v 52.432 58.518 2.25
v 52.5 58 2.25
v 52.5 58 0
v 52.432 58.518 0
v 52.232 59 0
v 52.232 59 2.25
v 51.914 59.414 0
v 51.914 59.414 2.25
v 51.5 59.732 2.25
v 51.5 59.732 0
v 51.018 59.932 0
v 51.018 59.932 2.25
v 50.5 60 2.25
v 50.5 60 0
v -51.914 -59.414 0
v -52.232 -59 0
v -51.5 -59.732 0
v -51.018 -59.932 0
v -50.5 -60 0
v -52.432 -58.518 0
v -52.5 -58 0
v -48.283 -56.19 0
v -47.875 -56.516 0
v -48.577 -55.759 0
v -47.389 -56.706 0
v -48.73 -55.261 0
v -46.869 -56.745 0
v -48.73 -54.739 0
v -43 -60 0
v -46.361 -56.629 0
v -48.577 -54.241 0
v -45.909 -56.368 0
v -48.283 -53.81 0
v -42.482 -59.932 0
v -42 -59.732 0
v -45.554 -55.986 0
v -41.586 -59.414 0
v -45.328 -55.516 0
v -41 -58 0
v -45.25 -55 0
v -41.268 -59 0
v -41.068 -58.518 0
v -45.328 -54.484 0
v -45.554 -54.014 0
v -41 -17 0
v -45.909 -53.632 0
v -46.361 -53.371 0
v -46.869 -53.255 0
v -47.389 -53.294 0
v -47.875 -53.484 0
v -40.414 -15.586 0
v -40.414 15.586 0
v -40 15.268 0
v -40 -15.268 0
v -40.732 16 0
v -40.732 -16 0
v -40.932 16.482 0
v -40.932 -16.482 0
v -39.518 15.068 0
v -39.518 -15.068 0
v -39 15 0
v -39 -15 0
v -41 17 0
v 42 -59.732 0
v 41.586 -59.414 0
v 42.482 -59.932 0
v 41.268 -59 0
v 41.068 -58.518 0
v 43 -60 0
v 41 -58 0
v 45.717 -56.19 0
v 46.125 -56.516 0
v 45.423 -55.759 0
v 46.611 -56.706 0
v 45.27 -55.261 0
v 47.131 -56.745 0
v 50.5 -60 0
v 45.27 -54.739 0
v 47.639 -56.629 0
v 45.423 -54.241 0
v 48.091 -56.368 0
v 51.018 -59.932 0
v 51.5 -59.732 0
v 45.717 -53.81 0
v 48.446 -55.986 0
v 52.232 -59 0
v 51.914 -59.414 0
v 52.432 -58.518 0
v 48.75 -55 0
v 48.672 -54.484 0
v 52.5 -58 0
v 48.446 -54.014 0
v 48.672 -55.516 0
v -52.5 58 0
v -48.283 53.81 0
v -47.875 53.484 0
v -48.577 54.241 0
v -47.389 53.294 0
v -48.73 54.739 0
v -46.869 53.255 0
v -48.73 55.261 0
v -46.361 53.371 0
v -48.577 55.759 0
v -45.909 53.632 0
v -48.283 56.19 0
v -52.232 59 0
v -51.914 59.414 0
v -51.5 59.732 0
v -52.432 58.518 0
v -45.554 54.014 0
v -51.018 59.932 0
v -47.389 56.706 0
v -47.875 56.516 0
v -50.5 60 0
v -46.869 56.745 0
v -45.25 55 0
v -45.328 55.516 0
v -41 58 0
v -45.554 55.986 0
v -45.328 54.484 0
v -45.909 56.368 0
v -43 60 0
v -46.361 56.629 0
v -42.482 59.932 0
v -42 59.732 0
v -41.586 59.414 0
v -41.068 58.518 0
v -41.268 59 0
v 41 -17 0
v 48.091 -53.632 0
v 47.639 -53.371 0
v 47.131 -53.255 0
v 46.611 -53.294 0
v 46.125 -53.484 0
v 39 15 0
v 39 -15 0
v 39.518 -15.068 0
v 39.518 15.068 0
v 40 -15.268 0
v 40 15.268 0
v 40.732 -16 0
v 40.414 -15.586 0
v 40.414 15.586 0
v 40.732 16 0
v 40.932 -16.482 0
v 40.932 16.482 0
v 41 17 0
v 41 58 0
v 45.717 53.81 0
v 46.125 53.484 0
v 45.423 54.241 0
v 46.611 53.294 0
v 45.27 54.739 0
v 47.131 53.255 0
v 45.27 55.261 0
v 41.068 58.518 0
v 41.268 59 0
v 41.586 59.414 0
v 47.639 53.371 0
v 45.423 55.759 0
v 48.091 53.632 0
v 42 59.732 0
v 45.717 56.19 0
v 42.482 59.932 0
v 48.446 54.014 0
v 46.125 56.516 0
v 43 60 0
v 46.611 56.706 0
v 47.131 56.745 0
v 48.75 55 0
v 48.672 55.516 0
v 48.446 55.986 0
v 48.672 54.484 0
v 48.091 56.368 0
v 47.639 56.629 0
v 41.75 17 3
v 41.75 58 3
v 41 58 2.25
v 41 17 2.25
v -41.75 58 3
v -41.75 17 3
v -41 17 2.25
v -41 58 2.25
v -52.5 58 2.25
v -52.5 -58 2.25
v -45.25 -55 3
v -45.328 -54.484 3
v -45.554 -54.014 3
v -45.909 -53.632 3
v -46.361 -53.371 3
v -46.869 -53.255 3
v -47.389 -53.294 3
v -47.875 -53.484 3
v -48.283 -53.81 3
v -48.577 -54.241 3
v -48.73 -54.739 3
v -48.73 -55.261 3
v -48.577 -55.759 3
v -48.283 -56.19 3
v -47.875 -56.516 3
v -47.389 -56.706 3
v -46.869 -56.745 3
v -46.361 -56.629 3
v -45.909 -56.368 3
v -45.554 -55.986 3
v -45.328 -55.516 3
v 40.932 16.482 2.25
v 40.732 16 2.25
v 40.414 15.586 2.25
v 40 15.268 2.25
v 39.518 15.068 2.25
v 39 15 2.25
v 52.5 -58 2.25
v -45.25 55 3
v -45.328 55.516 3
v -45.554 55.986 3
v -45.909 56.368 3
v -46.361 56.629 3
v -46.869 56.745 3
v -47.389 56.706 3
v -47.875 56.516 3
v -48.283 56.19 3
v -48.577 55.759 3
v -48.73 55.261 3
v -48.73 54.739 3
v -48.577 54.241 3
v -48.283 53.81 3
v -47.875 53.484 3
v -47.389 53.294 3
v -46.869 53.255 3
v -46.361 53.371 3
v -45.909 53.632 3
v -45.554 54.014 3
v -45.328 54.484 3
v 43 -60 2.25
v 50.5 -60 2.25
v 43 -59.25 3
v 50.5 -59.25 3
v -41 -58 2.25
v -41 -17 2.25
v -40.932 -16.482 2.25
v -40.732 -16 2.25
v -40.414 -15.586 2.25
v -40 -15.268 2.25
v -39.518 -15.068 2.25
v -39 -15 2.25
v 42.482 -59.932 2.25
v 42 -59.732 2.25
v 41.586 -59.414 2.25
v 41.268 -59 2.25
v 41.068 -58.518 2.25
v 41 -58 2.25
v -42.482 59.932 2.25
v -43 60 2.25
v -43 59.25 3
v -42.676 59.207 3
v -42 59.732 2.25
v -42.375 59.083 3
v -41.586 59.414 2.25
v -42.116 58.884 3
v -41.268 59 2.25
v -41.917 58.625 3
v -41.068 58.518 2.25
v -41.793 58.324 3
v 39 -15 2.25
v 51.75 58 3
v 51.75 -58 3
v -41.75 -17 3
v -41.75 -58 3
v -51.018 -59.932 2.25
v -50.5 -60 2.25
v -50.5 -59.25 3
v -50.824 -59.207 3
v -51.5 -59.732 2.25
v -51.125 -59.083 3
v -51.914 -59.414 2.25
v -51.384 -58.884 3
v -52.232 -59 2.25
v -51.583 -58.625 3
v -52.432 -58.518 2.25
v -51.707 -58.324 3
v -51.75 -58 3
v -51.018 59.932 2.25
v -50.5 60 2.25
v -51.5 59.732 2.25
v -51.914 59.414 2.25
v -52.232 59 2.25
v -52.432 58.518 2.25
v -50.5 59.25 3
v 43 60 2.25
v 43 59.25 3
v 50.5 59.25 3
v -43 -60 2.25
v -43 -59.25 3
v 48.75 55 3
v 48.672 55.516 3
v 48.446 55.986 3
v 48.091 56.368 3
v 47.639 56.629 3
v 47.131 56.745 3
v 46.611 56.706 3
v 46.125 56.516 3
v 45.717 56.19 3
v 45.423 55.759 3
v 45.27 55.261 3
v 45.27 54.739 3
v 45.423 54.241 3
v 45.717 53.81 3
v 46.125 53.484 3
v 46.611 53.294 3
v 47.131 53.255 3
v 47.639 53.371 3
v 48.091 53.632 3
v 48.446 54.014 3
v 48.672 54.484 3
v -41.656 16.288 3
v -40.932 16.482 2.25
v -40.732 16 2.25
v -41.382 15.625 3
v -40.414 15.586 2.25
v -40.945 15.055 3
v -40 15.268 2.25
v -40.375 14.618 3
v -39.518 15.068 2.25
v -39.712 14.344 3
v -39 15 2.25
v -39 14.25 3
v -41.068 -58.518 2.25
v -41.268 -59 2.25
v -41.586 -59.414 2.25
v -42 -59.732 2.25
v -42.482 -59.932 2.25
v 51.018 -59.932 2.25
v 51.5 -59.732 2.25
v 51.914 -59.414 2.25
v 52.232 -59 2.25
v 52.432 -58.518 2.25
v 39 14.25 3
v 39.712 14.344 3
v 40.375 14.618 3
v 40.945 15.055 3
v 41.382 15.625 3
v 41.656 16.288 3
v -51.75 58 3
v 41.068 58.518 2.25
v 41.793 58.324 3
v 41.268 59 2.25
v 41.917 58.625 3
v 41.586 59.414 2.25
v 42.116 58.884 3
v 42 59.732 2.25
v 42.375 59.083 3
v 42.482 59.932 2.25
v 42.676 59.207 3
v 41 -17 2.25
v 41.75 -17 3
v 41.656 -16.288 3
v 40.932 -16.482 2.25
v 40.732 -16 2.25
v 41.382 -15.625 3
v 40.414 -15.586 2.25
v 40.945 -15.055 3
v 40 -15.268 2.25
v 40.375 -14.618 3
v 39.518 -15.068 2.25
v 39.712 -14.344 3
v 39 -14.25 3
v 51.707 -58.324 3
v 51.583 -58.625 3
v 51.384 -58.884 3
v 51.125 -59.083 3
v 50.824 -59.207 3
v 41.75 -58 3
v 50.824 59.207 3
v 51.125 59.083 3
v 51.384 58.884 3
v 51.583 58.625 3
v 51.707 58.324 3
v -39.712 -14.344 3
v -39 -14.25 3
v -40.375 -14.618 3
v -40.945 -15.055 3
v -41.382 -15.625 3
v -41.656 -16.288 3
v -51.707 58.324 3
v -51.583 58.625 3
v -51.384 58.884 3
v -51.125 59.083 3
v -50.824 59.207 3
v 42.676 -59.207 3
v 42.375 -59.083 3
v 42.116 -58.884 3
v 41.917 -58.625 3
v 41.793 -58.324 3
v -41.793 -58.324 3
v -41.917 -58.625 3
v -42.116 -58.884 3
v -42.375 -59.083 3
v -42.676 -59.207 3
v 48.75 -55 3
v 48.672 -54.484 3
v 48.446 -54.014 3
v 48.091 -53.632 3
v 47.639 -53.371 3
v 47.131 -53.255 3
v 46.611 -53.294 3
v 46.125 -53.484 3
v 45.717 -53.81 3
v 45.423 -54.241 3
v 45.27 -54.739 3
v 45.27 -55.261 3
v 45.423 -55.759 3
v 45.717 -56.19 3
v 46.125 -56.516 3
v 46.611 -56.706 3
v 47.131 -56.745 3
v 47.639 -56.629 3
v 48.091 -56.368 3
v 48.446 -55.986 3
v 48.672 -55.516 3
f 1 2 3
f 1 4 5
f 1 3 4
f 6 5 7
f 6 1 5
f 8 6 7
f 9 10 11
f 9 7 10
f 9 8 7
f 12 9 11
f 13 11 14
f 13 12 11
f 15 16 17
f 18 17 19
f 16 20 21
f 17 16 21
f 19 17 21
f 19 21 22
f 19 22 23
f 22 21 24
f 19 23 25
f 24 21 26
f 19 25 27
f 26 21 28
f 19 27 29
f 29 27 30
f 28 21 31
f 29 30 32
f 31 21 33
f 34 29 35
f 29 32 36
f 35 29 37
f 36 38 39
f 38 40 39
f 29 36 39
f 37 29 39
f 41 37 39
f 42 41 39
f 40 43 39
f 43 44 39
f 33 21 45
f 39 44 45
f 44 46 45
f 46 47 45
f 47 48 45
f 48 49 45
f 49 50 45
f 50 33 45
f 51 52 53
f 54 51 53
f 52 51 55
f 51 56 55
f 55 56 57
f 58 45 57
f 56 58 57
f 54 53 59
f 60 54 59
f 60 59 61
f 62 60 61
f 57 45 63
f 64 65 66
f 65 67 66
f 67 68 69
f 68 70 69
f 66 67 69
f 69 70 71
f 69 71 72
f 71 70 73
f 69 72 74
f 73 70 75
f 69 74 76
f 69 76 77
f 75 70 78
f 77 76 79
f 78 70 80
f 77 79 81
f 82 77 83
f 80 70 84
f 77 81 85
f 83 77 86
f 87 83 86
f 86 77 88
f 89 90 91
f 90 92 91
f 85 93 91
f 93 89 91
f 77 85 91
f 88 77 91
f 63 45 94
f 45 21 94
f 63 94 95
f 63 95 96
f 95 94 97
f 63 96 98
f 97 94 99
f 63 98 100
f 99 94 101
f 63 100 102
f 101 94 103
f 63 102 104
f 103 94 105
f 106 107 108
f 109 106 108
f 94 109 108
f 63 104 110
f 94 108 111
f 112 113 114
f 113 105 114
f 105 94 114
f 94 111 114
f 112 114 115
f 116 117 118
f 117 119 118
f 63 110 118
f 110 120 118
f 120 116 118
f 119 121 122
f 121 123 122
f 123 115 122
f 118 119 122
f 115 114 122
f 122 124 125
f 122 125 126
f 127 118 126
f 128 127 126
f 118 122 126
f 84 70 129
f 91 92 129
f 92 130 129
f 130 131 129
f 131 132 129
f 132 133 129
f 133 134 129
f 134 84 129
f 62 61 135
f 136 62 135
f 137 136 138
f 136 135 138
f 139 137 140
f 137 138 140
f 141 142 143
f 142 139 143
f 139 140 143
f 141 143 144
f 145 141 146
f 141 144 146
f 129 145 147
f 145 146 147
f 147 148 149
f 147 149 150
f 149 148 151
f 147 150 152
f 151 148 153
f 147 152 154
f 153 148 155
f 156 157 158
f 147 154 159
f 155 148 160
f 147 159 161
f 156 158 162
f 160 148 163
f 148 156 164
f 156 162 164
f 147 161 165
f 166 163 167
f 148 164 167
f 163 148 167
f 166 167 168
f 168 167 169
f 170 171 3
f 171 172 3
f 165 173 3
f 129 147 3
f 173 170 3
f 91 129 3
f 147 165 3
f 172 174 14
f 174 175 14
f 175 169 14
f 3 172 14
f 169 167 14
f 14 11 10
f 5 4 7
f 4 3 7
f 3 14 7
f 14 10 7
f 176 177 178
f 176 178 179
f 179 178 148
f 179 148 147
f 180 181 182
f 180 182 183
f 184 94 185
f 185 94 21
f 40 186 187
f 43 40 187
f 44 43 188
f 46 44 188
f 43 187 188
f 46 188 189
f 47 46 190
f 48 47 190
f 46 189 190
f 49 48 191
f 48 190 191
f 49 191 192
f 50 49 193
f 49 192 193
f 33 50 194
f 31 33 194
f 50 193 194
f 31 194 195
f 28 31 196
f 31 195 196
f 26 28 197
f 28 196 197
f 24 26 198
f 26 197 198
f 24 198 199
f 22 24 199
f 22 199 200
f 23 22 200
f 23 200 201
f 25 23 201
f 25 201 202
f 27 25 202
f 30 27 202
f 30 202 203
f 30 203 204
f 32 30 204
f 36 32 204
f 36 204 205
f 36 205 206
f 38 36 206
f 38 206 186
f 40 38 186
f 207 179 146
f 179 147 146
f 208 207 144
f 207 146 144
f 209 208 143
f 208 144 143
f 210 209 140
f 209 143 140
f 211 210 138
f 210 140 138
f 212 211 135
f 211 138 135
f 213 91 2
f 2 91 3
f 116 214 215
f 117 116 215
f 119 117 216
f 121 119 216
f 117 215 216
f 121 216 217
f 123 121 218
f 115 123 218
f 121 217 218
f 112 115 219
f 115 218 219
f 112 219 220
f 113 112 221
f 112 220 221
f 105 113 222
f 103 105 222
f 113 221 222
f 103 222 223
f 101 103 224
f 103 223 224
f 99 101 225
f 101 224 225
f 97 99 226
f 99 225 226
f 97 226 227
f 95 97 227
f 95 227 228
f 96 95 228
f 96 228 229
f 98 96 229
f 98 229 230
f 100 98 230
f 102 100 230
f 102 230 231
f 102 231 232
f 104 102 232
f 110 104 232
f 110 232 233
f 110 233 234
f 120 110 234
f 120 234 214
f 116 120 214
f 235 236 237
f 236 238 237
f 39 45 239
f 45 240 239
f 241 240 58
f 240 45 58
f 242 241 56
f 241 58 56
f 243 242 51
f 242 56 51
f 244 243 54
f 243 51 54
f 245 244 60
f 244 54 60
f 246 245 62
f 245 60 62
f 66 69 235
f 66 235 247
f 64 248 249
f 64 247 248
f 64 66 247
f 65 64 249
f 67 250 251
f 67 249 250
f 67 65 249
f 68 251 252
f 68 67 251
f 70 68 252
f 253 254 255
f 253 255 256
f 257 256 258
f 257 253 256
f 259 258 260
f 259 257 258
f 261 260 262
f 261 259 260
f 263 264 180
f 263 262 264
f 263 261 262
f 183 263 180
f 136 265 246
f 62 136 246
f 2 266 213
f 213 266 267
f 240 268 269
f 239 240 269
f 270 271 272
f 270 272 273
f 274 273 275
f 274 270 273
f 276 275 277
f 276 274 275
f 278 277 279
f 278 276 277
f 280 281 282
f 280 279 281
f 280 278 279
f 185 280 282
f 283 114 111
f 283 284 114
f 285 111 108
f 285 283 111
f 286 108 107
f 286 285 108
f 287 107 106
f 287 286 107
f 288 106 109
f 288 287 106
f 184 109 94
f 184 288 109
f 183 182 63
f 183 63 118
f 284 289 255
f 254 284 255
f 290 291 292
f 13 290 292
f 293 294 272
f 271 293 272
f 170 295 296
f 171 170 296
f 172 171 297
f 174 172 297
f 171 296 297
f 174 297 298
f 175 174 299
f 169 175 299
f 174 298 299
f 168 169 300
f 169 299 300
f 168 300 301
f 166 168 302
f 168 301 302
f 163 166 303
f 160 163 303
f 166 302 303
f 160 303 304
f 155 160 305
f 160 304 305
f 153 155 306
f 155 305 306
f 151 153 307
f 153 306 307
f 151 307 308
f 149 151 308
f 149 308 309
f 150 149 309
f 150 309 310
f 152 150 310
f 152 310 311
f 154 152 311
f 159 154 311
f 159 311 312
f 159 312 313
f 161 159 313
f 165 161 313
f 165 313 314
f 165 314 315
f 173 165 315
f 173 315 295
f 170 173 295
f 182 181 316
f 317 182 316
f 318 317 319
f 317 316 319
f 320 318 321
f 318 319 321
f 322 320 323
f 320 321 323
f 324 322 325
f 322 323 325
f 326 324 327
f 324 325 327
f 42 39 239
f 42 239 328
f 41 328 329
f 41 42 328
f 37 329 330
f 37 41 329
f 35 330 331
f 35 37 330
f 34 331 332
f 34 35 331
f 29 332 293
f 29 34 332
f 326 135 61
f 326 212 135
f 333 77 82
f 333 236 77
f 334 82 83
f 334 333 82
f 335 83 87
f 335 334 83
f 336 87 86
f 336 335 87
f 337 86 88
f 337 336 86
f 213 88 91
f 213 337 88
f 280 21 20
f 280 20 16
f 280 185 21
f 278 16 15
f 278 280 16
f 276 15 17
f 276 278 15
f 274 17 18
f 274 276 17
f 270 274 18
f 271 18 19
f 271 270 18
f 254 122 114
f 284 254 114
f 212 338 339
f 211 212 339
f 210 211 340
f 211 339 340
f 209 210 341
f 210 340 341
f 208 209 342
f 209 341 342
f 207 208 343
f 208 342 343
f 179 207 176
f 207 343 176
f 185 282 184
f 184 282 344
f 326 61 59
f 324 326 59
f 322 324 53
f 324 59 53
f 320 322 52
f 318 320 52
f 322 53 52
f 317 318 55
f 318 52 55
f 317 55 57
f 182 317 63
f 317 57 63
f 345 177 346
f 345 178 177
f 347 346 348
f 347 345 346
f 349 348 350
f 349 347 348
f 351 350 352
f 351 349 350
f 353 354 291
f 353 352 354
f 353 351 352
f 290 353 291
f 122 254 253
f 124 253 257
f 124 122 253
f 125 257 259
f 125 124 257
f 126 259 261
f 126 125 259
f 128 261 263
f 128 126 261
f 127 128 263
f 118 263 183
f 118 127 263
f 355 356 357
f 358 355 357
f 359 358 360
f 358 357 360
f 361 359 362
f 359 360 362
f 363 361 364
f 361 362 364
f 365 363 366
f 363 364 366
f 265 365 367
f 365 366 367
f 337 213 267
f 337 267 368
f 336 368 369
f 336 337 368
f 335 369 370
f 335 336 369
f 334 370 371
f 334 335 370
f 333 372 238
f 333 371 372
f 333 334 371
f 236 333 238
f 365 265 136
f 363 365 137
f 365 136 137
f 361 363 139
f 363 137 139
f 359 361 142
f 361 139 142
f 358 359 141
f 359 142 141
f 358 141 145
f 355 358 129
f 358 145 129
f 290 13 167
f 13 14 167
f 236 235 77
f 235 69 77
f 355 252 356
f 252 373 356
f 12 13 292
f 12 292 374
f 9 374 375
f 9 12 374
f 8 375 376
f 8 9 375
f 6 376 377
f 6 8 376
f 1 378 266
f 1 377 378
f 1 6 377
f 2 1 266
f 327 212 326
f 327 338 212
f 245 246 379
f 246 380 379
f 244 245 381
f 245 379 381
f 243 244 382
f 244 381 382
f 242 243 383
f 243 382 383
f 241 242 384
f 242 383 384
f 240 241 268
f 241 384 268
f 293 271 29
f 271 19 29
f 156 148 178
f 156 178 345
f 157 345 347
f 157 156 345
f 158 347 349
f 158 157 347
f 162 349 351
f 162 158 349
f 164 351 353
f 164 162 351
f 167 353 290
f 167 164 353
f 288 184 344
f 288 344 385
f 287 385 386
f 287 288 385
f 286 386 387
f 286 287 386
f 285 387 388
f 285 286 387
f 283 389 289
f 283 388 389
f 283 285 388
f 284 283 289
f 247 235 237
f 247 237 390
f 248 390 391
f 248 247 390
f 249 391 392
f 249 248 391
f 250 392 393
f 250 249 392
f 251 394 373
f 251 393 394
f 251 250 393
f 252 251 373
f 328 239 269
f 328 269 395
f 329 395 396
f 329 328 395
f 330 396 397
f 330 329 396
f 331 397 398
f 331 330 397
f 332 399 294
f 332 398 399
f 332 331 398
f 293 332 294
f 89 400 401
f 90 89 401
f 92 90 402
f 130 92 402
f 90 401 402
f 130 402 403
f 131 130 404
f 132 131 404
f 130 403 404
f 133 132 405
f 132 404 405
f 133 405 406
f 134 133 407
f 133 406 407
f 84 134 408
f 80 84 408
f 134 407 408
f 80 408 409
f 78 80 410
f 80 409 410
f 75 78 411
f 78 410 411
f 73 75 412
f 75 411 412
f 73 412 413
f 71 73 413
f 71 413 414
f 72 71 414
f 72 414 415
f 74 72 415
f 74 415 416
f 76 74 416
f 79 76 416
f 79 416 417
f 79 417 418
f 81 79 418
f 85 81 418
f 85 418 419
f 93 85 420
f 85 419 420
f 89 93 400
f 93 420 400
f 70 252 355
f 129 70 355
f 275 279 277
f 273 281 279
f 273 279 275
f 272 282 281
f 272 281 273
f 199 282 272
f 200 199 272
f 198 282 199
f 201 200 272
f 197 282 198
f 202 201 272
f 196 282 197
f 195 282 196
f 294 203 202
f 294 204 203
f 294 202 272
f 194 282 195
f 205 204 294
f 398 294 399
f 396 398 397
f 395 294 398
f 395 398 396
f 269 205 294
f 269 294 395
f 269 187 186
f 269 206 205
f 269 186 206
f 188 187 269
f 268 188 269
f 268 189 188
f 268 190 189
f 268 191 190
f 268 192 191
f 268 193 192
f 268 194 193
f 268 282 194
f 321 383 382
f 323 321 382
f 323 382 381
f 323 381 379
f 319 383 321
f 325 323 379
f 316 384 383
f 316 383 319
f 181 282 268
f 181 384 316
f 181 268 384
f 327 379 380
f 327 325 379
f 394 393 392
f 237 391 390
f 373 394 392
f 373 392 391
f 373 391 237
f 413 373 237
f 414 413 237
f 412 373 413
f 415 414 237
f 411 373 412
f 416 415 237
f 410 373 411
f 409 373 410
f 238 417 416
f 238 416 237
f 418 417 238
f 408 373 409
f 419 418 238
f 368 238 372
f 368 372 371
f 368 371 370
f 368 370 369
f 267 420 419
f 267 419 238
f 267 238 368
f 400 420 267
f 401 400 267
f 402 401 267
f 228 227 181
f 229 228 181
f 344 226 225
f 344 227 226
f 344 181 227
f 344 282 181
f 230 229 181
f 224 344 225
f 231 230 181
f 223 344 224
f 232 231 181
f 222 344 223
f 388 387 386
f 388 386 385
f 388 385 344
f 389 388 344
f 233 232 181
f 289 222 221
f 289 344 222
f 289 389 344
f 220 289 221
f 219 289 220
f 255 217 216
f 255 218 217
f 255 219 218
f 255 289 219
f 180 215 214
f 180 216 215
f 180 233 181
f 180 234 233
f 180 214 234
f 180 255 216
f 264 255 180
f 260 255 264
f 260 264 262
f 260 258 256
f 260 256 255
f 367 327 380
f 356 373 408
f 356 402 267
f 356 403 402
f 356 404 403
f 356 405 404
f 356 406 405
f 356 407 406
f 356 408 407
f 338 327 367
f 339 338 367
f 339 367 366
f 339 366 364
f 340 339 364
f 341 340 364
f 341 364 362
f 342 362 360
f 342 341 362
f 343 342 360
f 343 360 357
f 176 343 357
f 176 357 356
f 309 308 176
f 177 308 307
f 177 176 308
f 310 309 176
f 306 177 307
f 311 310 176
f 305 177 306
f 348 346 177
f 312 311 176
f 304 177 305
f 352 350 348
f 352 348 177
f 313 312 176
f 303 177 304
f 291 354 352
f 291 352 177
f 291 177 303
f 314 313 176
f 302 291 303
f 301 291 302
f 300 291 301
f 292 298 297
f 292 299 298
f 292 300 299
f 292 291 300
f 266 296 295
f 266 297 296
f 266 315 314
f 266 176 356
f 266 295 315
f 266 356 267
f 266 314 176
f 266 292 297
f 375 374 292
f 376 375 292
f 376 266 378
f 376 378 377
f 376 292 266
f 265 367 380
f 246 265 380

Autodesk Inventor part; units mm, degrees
ref_plane "YZ Plane" through (0, 0, 0) normal (1, 0, 0) x (0, 1, 0)
ref_plane "XZ Plane" through (0, 0, 0) normal (0, 1, 0) x (-1, 0, 0)
ref_plane "XY Plane" through (0, 0, 0) normal (0, 0, 1) x (1, 0, 0)
sketch "Sketch1" plane through (0, 0, 0) normal (0, 0, 1) x (1, 0, 0)
  line L0 (-52.5, -60) -> (52.5, -60)
  line L1 (52.5, -60) -> (52.5, 60)
  line L2 (52.5, 60) -> (-52.5, 60)
  line L3 (-52.5, 60) -> (-52.5, -60)
  line L4 (-52.5, -60) -> (52.5, 60) construction
  line L5 (52.5, -60) -> (-52.5, 60) construction
  point P0 (0, 0)
  dimension "d0" = 105
  dimension "d1" = 120
extrude "Extrusion1" add sketch "Sketch1" along normal blind 3
sketch "Sketch2" plane through (0, 0, 3) normal (0, 0, 1) x (1, 0, 0)
  circle A0 centre (-47, 55) radius 1.75
  line L0 (-73.5, 0) -> (73.5, 0) construction
  line L1 (0, 84) -> (0, -84) construction
  circle A1 centre (47, 55) radius 1.75
  circle A2 centre (-47, -55) radius 1.75
  circle A3 centre (47, -55) radius 1.75
  point P0 (0, 0)
  dimension "d4" = 3.5
  dimension "d5" = 94
  dimension "d6" = 110
extrude "Extrusion2" cut sketch "Sketch2" against normal blind 3
sketch "Sketch3" plane through (0, 0, 3) normal (0, 0, 1) x (1, 0, 0)
  line L0 (52.5, 60) -> (-52.5, 60) construction
  line L1 (52.5, 60) -> (-52.5, 60) construction
  line L2 (-41, 60) -> (41, 60)
  line L3 (41, 60) -> (41, 15)
  line L4 (41, 15) -> (-41, 15)
  line L5 (-41, 15) -> (-41, 60)
  line L6 (-52.5, 60) -> (-52.5, -60) construction
  line L7 (52.5, -60) -> (52.5, 60) construction
  line L8 (-73.5, 0) -> (73.5, 0) projected
  line L9 (52.5, -60) -> (-52.5, -60) construction
  line L10 (52.5, -60) -> (-52.5, -60) construction
  line L11 (-41, -60) -> (41, -60)
  line L12 (41, -60) -> (41, -15)
  line L13 (41, -15) -> (-41, -15)
  line L14 (-41, -15) -> (-41, -60)
  point P0 (0, 0)
  dimension "d9" = 15
  dimension "d10" = 82
  dimension "d11" = 11.5
  dimension "d12" = 105
extrude "Extrusion3" cut sketch "Sketch3" against normal blind 3
fillet "Fillet1" radius 2 4 edges at (-41, 15, 1.5) (41, 15, 1.5) (41, -15, 1.5) (-41, -15, 1.5)
fillet "Fillet2" radius 2 8 edges at (41, 60, 1.5) (52.5, 60, 1.5) (-41, 60, 1.5) (-52.5, 60, 1.5) (-52.5, -60, 1.5) (-41, -60, 1.5) (41, -60, 1.5) (52.5, -60, 1.5)
chamfer "Chamfer1" distance 0.75 angle 45 24 edges at (52.5, 0, 3) (51.9142, 59.4142, 3) (46.75, 60, 3) (41.5858, 59.4142, 3) (41, 37.5, 3) (40.4142, 15.5858, 3) (0, 15, 3) (-40.4142, 15.5858, 3) (-41, 37.5, 3) (-41.5858, 59.4142, 3) (-46.75, 60, 3) (-51.9142, 59.4142, 3) (-52.5, 0, 3) (-51.9142, -59.4142, 3) (-46.75, -60, 3) (-41.5858, -59.4142, 3) (-41, -37.5, 3) (-40.4142, -15.5858, 3) (0, -15, 3) (40.4142, -15.5858, 3) (41, -37.5, 3) (41.5858, -59.4142, 3) (46.75, -60, 3) (51.9142, -59.4142, 3)
sketch "Sketch4" plane through (0, 0, 3) normal (0, 0, 1) x (1, 0, 0)
  line L0 (-41, 17) -> (-41, 58) projected
  arc A0 (-41, 17) -> (-39, 15) centre (-39, 17) ccw projected
  line L1 (39, 15) -> (-39, 15) projected
  arc A1 (39, 15) -> (41, 17) centre (39, 17) ccw projected
  line L2 (41, 58) -> (41, 17) projected
  arc A2 (43, 60) -> (41, 58) centre (43, 58) ccw projected
  line L3 (50.5, 60) -> (43, 60) projected
  arc A3 (52.5, 58) -> (50.5, 60) centre (50.5, 58) ccw projected
  line L4 (52.5, -58) -> (52.5, 58) projected
  arc A4 (50.5, -60) -> (52.5, -58) centre (50.5, -58) ccw projected
  line L5 (43, -60) -> (50.5, -60) projected
  arc A5 (41, -58) -> (43, -60) centre (43, -58) ccw projected
  line L6 (41, -17) -> (41, -58) projected
  arc A6 (41, -17) -> (39, -15) centre (39, -17) ccw projected
  line L7 (-39, -15) -> (39, -15) projected
  arc A7 (-39, -15) -> (-41, -17) centre (-39, -17) ccw projected
  line L8 (-41, -58) -> (-41, -17) projected
  arc A8 (-43, -60) -> (-41, -58) centre (-43, -58) ccw projected
  line L9 (-50.5, -60) -> (-43, -60) projected
  arc A9 (-52.5, -58) -> (-50.5, -60) centre (-50.5, -58) ccw projected
  line L10 (-52.5, 58) -> (-52.5, -58) projected
  arc A10 (-50.5, 60) -> (-52.5, 58) centre (-50.5, 58) ccw projected
  line L11 (-43, 60) -> (-50.5, 60) projected
  arc A11 (-41, 58) -> (-43, 60) centre (-43, 58) ccw projected
  circle A12 centre (-47, 55) radius 1.75 projected
  circle A13 centre (47, 55) radius 1.75 projected
  circle A14 centre (47, -55) radius 1.75 projected
  circle A15 centre (-47, -55) radius 1.75 projected
  point P0 (0, 0)
equation "\"d11\" = -0.5 * d10 + 0.5 * d12"
properties part number "BatteryHolderTop"
